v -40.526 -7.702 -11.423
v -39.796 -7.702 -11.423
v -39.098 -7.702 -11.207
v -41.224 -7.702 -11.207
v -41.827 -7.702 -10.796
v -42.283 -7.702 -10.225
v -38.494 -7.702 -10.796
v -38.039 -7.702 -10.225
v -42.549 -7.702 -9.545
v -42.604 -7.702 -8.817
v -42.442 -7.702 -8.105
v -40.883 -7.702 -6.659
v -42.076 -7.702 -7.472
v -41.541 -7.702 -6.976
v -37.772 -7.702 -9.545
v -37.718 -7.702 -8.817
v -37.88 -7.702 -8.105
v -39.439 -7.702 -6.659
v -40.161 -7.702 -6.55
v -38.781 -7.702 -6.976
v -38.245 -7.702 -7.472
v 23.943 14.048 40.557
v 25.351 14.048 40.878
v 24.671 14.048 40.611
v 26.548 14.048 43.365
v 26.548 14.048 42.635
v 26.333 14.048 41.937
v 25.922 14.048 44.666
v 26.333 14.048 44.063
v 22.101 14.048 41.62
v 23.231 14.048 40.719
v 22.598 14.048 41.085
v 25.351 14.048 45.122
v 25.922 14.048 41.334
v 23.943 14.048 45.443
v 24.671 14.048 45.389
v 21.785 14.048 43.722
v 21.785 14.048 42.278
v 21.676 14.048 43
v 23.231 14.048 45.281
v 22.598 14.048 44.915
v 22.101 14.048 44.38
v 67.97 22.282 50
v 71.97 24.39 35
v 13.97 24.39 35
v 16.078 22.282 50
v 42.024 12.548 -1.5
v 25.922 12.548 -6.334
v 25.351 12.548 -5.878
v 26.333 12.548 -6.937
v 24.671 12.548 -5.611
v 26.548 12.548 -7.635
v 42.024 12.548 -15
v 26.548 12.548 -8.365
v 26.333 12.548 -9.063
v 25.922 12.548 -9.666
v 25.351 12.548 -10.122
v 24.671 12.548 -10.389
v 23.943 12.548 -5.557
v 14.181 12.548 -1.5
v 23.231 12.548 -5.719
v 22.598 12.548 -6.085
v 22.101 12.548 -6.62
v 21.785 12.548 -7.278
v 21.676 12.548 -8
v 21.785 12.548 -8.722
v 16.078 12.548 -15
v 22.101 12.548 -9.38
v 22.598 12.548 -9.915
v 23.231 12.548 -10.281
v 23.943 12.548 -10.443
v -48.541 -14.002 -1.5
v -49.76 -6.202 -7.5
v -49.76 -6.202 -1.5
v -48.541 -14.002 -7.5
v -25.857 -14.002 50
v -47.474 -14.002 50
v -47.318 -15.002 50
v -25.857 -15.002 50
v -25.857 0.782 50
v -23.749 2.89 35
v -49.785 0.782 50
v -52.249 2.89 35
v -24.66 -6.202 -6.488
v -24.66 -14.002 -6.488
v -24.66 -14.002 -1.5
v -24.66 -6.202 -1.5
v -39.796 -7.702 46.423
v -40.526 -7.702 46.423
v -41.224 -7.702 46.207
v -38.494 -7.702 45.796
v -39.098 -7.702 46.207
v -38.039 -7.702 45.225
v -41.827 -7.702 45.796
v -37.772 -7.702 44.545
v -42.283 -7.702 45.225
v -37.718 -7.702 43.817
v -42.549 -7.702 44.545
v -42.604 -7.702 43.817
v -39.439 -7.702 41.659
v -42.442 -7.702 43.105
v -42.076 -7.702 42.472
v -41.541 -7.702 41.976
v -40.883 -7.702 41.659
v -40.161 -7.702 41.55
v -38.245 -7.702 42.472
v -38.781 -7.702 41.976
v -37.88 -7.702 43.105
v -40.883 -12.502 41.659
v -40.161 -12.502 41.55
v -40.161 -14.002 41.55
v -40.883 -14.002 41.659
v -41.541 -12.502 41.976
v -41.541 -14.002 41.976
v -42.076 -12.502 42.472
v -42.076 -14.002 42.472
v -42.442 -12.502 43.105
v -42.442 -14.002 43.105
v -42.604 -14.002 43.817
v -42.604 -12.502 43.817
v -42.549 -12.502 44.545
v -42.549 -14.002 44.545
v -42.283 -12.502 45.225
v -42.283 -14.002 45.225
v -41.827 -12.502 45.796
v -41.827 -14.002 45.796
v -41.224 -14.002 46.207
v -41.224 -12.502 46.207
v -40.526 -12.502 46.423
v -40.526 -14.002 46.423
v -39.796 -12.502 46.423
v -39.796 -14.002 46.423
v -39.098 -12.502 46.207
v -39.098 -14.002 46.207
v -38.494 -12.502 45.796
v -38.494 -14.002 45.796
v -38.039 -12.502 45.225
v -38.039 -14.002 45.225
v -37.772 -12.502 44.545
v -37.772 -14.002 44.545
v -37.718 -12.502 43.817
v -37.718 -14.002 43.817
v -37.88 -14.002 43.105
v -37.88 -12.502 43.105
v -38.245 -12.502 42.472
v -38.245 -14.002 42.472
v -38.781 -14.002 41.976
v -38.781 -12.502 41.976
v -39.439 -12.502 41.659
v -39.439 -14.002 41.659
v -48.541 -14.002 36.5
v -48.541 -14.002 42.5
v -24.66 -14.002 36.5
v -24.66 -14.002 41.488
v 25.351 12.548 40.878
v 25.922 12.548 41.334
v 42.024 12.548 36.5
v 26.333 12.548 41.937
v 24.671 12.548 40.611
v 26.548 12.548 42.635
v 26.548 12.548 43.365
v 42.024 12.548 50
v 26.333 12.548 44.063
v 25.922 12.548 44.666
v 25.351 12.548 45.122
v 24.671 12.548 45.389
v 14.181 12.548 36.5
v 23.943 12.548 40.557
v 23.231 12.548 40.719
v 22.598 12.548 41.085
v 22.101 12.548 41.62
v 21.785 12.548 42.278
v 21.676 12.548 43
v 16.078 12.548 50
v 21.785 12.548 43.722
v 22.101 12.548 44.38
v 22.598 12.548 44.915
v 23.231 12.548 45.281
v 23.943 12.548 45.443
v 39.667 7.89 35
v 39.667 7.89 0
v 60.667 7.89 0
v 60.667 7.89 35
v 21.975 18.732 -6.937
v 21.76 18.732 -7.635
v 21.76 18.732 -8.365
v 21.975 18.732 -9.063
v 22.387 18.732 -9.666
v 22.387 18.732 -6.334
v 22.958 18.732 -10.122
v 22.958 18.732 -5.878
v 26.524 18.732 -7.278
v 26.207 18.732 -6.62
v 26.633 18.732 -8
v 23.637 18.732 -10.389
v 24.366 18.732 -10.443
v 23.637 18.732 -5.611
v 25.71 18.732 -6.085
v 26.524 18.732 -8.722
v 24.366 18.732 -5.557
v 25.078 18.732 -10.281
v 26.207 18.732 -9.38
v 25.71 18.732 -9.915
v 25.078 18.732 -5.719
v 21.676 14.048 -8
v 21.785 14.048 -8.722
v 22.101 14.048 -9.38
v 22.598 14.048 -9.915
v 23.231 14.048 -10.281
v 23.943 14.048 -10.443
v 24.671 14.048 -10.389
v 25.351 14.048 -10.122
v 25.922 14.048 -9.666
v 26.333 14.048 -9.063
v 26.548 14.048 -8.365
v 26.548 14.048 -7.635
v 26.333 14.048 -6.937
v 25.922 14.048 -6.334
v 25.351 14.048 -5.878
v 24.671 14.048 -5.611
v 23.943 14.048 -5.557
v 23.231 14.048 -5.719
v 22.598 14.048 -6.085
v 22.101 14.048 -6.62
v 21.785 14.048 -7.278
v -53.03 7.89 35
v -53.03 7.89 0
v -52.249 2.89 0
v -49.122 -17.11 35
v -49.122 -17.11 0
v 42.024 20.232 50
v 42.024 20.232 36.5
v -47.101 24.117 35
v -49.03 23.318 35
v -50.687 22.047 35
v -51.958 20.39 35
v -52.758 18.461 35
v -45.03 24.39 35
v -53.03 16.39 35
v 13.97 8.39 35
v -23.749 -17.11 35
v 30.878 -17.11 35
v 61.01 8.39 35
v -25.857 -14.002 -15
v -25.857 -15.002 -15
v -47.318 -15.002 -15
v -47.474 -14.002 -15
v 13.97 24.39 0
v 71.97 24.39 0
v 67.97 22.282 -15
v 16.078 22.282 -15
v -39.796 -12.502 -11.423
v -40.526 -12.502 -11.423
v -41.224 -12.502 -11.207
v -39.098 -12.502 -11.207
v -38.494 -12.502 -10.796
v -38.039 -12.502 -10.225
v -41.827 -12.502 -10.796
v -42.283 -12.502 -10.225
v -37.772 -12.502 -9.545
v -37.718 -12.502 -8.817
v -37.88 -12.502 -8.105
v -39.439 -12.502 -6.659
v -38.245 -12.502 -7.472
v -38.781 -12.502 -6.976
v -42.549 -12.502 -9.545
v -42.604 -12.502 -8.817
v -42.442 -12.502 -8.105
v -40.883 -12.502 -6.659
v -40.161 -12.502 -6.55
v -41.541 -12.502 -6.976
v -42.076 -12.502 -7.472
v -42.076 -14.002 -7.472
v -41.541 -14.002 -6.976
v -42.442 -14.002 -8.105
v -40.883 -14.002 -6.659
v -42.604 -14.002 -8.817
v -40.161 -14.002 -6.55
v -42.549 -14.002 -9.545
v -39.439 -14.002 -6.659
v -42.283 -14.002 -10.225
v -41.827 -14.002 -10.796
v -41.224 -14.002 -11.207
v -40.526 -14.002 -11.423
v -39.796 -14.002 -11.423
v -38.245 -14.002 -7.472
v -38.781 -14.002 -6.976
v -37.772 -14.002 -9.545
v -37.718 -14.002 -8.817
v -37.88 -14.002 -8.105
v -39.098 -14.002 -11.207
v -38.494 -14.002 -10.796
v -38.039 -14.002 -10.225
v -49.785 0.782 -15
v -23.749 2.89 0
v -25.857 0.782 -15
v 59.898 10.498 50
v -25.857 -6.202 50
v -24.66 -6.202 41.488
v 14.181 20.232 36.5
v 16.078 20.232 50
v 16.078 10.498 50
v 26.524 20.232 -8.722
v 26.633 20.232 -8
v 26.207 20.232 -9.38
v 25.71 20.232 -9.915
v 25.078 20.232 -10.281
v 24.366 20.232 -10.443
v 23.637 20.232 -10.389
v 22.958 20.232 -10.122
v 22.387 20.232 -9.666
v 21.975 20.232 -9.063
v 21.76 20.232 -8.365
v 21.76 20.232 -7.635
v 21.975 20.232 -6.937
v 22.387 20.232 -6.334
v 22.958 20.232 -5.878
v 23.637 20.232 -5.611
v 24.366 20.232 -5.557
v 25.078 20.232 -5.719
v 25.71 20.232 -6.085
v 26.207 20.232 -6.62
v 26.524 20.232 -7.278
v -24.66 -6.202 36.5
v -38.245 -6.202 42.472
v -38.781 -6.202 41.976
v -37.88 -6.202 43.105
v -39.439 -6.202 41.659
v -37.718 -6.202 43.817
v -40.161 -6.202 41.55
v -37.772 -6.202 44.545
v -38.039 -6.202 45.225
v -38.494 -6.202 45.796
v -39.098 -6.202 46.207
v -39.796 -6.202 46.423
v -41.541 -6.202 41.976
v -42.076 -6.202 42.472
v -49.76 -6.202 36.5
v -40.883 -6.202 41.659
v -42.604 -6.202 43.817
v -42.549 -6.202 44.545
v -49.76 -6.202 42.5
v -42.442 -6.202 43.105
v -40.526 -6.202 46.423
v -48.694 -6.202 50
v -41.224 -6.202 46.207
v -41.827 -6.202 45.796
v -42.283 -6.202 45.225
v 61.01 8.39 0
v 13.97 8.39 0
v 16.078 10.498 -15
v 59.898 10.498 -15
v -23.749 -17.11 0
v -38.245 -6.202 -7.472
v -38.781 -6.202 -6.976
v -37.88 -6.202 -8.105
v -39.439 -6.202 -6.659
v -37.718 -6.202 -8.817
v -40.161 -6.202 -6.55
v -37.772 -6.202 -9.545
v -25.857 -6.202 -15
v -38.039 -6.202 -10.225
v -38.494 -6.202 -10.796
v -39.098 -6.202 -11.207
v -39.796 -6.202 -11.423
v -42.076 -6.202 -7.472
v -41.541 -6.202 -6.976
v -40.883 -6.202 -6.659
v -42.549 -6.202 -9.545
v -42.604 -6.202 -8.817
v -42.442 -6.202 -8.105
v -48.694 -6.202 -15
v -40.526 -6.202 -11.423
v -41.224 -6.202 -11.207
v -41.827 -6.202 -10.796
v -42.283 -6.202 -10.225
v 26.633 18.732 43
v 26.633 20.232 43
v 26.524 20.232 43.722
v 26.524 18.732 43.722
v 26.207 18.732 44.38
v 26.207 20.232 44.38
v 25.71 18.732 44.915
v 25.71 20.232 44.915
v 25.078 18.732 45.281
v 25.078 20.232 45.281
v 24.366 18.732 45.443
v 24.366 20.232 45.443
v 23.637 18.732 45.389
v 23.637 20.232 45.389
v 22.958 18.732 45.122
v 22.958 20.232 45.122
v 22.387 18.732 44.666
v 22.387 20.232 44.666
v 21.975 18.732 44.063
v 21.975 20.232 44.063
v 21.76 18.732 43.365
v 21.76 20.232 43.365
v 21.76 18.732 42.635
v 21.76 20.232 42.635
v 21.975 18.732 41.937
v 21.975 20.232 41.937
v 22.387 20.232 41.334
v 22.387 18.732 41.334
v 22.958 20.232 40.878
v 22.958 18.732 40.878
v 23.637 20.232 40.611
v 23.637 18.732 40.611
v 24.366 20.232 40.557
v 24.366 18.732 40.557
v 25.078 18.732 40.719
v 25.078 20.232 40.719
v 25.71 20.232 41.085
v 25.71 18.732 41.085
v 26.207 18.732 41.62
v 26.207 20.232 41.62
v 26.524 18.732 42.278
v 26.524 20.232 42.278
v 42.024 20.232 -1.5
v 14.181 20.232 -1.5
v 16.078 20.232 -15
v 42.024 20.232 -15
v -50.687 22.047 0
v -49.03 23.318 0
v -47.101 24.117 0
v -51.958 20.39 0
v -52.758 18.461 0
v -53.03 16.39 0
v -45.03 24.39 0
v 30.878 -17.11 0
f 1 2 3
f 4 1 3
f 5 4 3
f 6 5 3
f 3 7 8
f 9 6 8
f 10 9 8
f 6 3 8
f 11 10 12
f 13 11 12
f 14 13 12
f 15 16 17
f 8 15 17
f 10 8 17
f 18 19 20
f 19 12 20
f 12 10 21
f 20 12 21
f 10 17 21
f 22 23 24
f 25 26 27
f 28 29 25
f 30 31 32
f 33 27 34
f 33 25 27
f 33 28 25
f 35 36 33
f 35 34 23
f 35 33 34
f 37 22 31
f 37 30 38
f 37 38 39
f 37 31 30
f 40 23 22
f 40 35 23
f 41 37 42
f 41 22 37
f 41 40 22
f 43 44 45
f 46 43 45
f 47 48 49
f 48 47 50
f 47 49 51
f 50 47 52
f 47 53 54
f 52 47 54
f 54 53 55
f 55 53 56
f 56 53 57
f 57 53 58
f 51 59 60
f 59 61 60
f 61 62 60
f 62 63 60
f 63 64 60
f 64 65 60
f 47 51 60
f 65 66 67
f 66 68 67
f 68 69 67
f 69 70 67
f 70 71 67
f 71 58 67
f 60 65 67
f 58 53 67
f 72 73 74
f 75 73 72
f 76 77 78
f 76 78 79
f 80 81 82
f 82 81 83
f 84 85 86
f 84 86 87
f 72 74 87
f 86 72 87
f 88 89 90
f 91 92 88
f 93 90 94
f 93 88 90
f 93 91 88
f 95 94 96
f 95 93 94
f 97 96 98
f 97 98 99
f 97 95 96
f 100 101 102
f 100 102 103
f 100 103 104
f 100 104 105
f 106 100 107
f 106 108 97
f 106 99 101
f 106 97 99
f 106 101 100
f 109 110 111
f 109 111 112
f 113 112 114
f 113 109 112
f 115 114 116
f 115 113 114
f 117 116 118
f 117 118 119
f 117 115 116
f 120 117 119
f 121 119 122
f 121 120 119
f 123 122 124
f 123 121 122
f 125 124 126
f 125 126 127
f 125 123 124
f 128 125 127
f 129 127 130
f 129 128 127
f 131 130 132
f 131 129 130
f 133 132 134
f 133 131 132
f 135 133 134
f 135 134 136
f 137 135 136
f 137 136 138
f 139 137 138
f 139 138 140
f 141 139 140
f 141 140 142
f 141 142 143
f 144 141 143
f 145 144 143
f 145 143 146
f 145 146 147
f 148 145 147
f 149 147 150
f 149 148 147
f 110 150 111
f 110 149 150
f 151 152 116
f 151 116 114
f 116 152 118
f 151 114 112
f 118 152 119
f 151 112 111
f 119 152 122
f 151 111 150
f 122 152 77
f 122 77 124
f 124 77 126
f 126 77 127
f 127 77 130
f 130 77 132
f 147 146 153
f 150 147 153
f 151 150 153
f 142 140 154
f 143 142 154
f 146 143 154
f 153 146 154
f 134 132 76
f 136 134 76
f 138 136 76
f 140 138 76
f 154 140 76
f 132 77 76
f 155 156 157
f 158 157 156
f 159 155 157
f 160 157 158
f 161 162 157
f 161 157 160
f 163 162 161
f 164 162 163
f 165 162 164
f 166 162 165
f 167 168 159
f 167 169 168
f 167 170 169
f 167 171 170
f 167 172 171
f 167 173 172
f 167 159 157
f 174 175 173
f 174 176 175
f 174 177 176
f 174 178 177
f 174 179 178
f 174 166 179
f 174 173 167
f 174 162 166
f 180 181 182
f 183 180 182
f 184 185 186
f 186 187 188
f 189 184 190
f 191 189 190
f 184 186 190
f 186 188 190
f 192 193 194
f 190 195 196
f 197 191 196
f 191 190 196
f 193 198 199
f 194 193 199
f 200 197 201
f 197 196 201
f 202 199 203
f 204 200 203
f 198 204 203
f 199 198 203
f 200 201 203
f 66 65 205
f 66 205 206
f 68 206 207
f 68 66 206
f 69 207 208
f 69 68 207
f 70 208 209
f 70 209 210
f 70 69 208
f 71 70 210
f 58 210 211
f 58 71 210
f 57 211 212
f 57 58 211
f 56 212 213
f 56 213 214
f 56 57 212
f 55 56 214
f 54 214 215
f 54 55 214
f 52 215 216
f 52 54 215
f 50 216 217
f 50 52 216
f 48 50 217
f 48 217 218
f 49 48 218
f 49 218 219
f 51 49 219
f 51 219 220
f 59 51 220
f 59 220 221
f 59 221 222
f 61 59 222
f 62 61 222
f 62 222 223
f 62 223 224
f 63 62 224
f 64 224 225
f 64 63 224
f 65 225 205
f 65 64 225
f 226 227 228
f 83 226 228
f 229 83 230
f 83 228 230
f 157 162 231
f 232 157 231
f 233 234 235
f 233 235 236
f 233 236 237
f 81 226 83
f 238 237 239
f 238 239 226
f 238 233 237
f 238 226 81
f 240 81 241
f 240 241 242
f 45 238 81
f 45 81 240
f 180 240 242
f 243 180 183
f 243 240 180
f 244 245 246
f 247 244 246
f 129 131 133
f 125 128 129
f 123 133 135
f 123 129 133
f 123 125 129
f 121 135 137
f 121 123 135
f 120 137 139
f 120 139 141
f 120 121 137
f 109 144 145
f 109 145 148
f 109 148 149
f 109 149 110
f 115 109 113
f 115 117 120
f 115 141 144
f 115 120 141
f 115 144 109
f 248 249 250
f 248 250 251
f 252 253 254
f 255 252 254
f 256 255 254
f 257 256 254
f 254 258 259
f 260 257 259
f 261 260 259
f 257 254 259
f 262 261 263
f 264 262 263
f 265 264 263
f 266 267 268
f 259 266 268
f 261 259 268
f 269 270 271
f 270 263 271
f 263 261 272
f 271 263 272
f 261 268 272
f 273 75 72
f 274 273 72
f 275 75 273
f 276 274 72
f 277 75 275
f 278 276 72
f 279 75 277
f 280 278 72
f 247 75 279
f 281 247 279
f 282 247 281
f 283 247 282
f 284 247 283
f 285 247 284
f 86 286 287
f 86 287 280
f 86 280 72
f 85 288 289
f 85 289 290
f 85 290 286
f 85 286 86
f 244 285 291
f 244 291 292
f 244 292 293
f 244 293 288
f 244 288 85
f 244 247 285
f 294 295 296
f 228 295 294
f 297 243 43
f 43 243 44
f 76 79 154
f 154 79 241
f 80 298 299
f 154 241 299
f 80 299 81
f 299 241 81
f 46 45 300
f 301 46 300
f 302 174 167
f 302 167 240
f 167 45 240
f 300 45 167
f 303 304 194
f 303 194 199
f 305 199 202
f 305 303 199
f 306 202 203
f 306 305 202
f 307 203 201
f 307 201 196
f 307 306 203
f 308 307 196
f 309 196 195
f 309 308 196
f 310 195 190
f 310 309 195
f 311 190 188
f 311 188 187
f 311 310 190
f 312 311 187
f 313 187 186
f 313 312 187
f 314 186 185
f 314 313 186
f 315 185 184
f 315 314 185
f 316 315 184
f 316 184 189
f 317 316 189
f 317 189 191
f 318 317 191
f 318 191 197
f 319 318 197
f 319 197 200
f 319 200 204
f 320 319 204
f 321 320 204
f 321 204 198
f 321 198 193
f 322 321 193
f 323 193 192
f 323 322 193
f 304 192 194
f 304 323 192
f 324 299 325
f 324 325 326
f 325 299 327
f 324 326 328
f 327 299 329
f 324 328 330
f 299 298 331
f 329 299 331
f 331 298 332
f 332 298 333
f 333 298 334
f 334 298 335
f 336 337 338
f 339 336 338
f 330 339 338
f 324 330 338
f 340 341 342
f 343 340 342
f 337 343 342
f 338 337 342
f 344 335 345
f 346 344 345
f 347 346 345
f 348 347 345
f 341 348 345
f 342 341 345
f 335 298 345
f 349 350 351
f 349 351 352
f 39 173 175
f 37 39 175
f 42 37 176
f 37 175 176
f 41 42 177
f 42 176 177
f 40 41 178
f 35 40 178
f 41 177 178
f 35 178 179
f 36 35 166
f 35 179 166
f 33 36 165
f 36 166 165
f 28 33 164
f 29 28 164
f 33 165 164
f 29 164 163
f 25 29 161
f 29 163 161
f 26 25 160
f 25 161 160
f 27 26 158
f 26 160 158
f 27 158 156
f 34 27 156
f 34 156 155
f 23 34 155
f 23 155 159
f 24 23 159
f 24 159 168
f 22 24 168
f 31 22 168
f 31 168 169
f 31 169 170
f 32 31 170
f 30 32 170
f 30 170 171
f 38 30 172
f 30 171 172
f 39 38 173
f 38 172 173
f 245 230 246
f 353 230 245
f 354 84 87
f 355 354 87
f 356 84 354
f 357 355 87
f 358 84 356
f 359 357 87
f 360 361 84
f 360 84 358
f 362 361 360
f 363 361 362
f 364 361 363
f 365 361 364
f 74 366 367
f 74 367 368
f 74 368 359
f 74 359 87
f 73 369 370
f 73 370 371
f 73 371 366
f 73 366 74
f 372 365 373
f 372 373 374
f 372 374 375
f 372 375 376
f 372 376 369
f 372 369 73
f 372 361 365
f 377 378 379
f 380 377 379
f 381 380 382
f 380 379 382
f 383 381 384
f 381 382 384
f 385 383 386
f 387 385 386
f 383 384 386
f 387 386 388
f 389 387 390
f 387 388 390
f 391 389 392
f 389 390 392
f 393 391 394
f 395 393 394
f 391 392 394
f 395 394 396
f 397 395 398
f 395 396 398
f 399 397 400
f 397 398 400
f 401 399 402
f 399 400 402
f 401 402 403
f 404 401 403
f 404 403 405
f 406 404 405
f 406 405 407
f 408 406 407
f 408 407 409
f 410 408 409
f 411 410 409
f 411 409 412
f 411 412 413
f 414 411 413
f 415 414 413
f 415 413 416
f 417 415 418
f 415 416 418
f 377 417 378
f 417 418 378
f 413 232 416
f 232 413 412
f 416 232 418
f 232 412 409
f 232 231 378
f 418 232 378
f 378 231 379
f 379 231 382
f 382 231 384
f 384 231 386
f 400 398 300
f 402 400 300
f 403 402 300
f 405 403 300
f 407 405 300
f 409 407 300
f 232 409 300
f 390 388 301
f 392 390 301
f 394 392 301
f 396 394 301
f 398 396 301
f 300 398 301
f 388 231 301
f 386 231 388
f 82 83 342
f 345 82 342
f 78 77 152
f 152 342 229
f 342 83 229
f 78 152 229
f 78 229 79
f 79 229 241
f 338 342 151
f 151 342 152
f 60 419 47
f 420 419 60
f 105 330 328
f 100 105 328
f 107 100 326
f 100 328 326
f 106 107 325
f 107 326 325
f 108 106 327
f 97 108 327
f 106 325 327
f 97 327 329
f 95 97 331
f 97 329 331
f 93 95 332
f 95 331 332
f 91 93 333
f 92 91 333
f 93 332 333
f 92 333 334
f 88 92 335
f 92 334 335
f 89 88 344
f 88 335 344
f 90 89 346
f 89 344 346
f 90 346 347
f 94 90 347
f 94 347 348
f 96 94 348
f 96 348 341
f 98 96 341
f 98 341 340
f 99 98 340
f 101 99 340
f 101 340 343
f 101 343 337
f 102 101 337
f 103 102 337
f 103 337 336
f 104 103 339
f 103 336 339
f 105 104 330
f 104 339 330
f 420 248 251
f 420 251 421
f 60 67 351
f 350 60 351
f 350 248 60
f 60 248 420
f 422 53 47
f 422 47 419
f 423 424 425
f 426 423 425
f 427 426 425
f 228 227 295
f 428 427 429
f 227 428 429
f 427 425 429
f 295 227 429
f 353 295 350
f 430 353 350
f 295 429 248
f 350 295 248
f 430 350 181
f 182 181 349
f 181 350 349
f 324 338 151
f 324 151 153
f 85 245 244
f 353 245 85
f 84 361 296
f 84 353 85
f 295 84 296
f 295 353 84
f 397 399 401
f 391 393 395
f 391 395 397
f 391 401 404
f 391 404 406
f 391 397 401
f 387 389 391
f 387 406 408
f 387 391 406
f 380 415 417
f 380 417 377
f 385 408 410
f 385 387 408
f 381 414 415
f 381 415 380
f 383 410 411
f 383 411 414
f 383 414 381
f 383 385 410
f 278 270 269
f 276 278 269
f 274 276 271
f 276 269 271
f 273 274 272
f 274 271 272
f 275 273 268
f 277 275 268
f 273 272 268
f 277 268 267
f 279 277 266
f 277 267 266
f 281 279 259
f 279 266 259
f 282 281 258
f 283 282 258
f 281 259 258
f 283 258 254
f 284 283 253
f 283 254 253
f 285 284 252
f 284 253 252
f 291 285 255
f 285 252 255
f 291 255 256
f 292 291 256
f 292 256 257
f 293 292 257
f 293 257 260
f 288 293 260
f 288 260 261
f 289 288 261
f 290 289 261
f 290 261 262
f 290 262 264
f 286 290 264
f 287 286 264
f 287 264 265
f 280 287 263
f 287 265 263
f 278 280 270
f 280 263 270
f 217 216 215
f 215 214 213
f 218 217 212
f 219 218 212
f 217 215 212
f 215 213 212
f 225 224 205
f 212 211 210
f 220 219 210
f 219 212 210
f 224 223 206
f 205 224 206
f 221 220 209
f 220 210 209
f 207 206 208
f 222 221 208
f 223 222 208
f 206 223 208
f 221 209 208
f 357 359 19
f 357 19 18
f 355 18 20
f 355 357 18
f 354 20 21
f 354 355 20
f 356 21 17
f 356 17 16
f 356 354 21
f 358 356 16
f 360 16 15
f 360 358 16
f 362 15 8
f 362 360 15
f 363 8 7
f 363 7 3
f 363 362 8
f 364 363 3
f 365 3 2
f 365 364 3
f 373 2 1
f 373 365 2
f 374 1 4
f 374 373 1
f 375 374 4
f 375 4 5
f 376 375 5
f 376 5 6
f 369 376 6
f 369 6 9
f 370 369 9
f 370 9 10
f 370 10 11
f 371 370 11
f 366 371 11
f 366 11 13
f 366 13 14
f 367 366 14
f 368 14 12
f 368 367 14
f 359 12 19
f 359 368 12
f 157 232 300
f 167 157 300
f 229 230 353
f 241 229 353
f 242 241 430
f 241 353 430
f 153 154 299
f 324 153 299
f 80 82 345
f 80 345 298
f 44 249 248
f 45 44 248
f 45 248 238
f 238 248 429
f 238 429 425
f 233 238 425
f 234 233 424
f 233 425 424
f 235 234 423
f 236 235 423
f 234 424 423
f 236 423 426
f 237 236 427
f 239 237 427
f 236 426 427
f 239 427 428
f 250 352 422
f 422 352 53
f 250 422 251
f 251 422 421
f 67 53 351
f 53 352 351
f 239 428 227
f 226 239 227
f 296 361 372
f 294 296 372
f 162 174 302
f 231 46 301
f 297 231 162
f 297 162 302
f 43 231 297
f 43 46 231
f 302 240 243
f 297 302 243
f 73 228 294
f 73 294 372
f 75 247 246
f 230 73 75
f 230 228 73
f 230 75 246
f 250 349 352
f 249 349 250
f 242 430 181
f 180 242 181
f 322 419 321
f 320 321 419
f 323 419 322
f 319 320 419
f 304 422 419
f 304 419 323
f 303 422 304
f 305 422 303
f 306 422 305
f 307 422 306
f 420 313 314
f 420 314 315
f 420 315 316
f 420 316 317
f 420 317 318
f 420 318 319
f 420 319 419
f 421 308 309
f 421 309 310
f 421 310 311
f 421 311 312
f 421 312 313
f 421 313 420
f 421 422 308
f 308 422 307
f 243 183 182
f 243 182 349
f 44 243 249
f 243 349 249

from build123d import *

# Parameters (mm, degrees)
SALIENTE_EXTRUIR1_DEPTH           = 35
SALIENTE_EXTRUIR2_DEPTH           = 15
SALIENTE_EXTRUIR2_DRAFT           = 8
SALIENTE_EXTRUIR2_PROFILE_2_DEPTH = 15
SALIENTE_EXTRUIR2_PROFILE_2_DRAFT = 8
SIMETR_A1_COPY_1_DEPTH            = 15
SIMETR_A1_COPY_1_DRAFT            = 8
SIMETR_A1_COPY_2_DEPTH            = 15
SIMETR_A1_COPY_2_DRAFT            = 8
SIMETR_A1_COPY_3_DEPTH            = 15
SIMETR_A1_COPY_3_DRAFT            = 8
CROQUIS6_W                        = 28.054373897
CROQUIS6_H                        = 7.683774959
CORTAR_EXTRUIR2_DEPTH             = 13.5
CROQUIS8_R                        = 2.45
SALIENTE_EXTRUIR3_DEPTH           = 1.5
CROQUIS9_R                        = 2.45
SALIENTE_EXTRUIR4_DEPTH           = 1.5
CROQUIS10_R                       = 2.45
SALIENTE_EXTRUIR5_DEPTH           = 1.5
SALIENTE_EXTRUIR6_START           = 1.5
CROQUIS13_R                       = 2.45
SALIENTE_EXTRUIR6_DEPTH           = 1.5


with BuildPart() as part:
    # Croquis2 → Saliente-Extruir1 (new body)
    with BuildSketch(Plane.XY):
        with BuildLine():
            Line((30.877885102, -17.110048254), (39.667083018, 7.889951746))
            Line((39.667083018, 7.889951746), (60.667083018, 7.889951746))
            Line((60.667083018, 7.889951746), (71.969737573, 24.389951746))
            Line((71.969737573, 24.389951746), (-45.030262427, 24.389951746))
            ThreePointArc((-45.030262427, 24.389951746), (-50.687116676, 22.046805996), (-53.030262427, 16.389951746))
            Line((-53.030262427, 16.389951746), (-53.030262427, 7.889951746))
            Line((-53.030262427, 7.889951746), (-49.122114898, -17.110048254))
            Line((-49.122114898, -17.110048254), (30.877885102, -17.110048254))
        make_face()
    extrude(amount=SALIENTE_EXTRUIR1_DEPTH)


with BuildPart() as saliente_extruir2_tool:
    # Croquis5 → Saliente-Extruir2 (with draft: the straight prism first)
    with BuildSketch(Plane.XY.offset(35)):
        Polygon((-49.122114898, -17.110048254), (-23.748632921, -17.110048254), (-23.748632921, 2.889951746), (-52.248632921, 2.889951746), align=None)
    extrude(amount=SALIENTE_EXTRUIR2_DEPTH)
    # Saliente-Extruir2: the draft: its side faces are tilted about the plane it starts from
    saliente_extruir2_sides = [saliente_extruir2_tool.faces().sort_by_distance(p)[0] for p in [
        (-36.435373909, -17.110048254, 42.5),
        (-23.748632921, -7.110048254, 42.5),
        (-37.998632921, 2.889951746, 42.5),
        (-50.685373909, -7.110048254, 42.5),
    ]]
    draft(saliente_extruir2_sides, Plane.XY.offset(35), SALIENTE_EXTRUIR2_DRAFT)


with BuildPart() as part_1:
    add(part.part)

    # Saliente-Extruir2: add saliente_extruir2_tool
    add(saliente_extruir2_tool.part)


with BuildPart() as saliente_extruir2_profile_2_tool:
    # Croquis5 → Saliente-Extruir2 profile 2 (with draft: the straight prism first)
    with BuildSketch(Plane.XY.offset(35)):
        Polygon((71.969737573, 24.389951746), (13.969737573, 24.389951746), (13.969737573, 8.389951746), (61.009587702, 8.389951746), align=None)
    extrude(amount=SALIENTE_EXTRUIR2_PROFILE_2_DEPTH)
    # Saliente-Extruir2 profile 2: the draft: its side faces are tilted about the plane it starts from
    saliente_extruir2_profile_2_sides = [saliente_extruir2_profile_2_tool.faces().sort_by_distance(p)[0] for p in [
        (42.969737573, 24.389951746, 42.5),
        (13.969737573, 16.389951746, 42.5),
        (37.489662638, 8.389951746, 42.5),
        (66.489662638, 16.389951746, 42.5),
    ]]
    draft(saliente_extruir2_profile_2_sides, Plane.XY.offset(35), SALIENTE_EXTRUIR2_PROFILE_2_DRAFT)


with BuildPart() as part_2:
    add(part_1.part)

    # Saliente-Extruir2 profile 2: add saliente_extruir2_profile_2_tool
    add(saliente_extruir2_profile_2_tool.part)


with BuildPart() as simetr_a1_copy_1_tool:
    # Simetría1 copy 1 sketch → Simetría1 copy 1 (with draft: the straight prism first)
    with BuildSketch(Plane(origin=(0, 0, 0), x_dir=(1, 0, 0), z_dir=(0, 0, -1))):
        Polygon((-49.122114898, 17.110048254), (-23.748632921, 17.110048254), (-23.748632921, -2.889951746), (-52.248632921, -2.889951746), align=None)
    extrude(amount=SIMETR_A1_COPY_1_DEPTH)
    # Simetría1 copy 1: the draft: its side faces are tilted about the plane it starts from
    simetr_a1_copy_1_sides = [simetr_a1_copy_1_tool.faces().sort_by_distance(p)[0] for p in [
        (-36.435373909, -17.110048254, -7.5),
        (-23.748632921, -7.110048254, -7.5),
        (-37.998632921, 2.889951746, -7.5),
        (-50.685373909, -7.110048254, -7.5),
    ]]
    draft(simetr_a1_copy_1_sides, Plane(origin=(0, 0, 0), x_dir=(1, 0, 0), z_dir=(0, 0, -1)), SIMETR_A1_COPY_1_DRAFT)


with BuildPart() as part_3:
    add(part_2.part)

    # Simetría1 copy 1: add simetr_a1_copy_1_tool
    add(simetr_a1_copy_1_tool.part)


with BuildPart() as simetr_a1_copy_2_tool:
    # Simetría1 copy 2 sketch → Simetría1 copy 2 (with draft: the straight prism first)
    with BuildSketch(Plane(origin=(0, 0, 0), x_dir=(1, 0, 0), z_dir=(0, 0, -1))):
        Polygon((71.969737573, -24.389951746), (13.969737573, -24.389951746), (13.969737573, -8.389951746), (61.009587702, -8.389951746), align=None)
    extrude(amount=SIMETR_A1_COPY_2_DEPTH)
    # Simetría1 copy 2: the draft: its side faces are tilted about the plane it starts from
    simetr_a1_copy_2_sides = [simetr_a1_copy_2_tool.faces().sort_by_distance(p)[0] for p in [
        (42.969737573, 24.389951746, -7.5),
        (13.969737573, 16.389951746, -7.5),
        (37.489662638, 8.389951746, -7.5),
        (66.489662638, 16.389951746, -7.5),
    ]]
    draft(simetr_a1_copy_2_sides, Plane(origin=(0, 0, 0), x_dir=(1, 0, 0), z_dir=(0, 0, -1)), SIMETR_A1_COPY_2_DRAFT)


with BuildPart() as part_4:
    add(part_3.part)

    # Simetría1 copy 2: add simetr_a1_copy_2_tool
    add(simetr_a1_copy_2_tool.part)


with BuildPart() as simetr_a1_copy_3_tool:
    # Simetría1 copy 3 sketch → Simetría1 copy 3 (with draft: the straight prism first)
    with BuildSketch(Plane(origin=(0, 0, 0), x_dir=(1, 0, 0), z_dir=(0, 0, -1))):
        Polygon((71.969737573, -24.389951746), (13.969737573, -24.389951746), (13.969737573, -8.389951746), (61.009587702, -8.389951746), align=None)
    extrude(amount=SIMETR_A1_COPY_3_DEPTH)
    # Simetría1 copy 3: the draft: its side faces are tilted about the plane it starts from
    simetr_a1_copy_3_sides = [simetr_a1_copy_3_tool.faces().sort_by_distance(p)[0] for p in [
        (42.969737573, 24.389951746, -7.5),
        (13.969737573, 16.389951746, -7.5),
        (37.489662638, 8.389951746, -7.5),
        (66.489662638, 16.389951746, -7.5),
    ]]
    draft(simetr_a1_copy_3_sides, Plane(origin=(0, 0, 0), x_dir=(1, 0, 0), z_dir=(0, 0, -1)), SIMETR_A1_COPY_3_DRAFT)


with BuildPart() as part_5:
    add(part_4.part)

    # Simetría1 copy 3: add simetr_a1_copy_3_tool
    add(simetr_a1_copy_3_tool.part)

    # Croquis6 → Cortar-Extruir2 (cut)
    with BuildSketch(Plane(origin=(0, 0, -15), x_dir=(-1, 0, 0), z_dir=(0, 0, -1))):
        with Locations((-27.996924522, 16.389951747)):
            Rectangle(CROQUIS6_W, CROQUIS6_H)
        Polygon((24.660477495, -6.201935733), (49.760477495, -6.201935733), (48.541135466, -14.001935733), (24.660477495, -14.001935733), align=None)
    cortar_extruir2 = extrude(amount=-CORTAR_EXTRUIR2_DEPTH, mode=Mode.SUBTRACT)

    # Simetría2: Cortar-Extruir2 across plane
    add(cortar_extruir2.mirror(Plane(origin=(0, 0, 17.5), x_dir=(1, 0, 0), z_dir=(0, 0, -1))), mode=Mode.SUBTRACT)

    # Croquis8 → Saliente-Extruir3 (add)
    with BuildSketch(Plane.XZ.offset(-20.231839226)):
        with Locations((24.182512404, 43)):
            Circle(CROQUIS8_R)
    saliente_extruir3 = extrude(amount=SALIENTE_EXTRUIR3_DEPTH)

    # Simetría3: Saliente-Extruir3 across plane
    add(saliente_extruir3.mirror(Plane(origin=(0, 0, 17.5), x_dir=(1, 0, 0), z_dir=(0, 0, -1))))

    # Croquis9 → Saliente-Extruir4 (add)
    with BuildSketch(Plane(origin=(0, 12.548064267, 0), x_dir=(1, 0, 0), z_dir=(0, 1, 0))):
        with Locations(Location((24.125726568, -43, 0), (0, 0, 180))):
            Circle(CROQUIS9_R)
    saliente_extruir4 = extrude(amount=SALIENTE_EXTRUIR4_DEPTH)

    # Simetría4: Saliente-Extruir4 across plane
    add(saliente_extruir4.mirror(Plane(origin=(0, 0, 17.5), x_dir=(1, 0, 0), z_dir=(0, 0, -1))))

    # Croquis10 → Saliente-Extruir5 (add)
    with BuildSketch(Plane.XZ.offset(6.201935733)):
        with Locations(Location((-40.160914021, 44, 0), (0, 0, 270))):
            Circle(CROQUIS10_R)
    saliente_extruir5 = extrude(amount=SALIENTE_EXTRUIR5_DEPTH)

    # Simetría5: Saliente-Extruir5 across plane
    add(saliente_extruir5.mirror(Plane(origin=(0, 0, 17.5), x_dir=(1, 0, 0), z_dir=(0, 0, -1))))

    # Croquis13 → Saliente-Extruir6 (add)
    with BuildSketch(Plane(origin=(0, -14.001935733, 0), x_dir=(1, 0, 0), z_dir=(0, 1, 0)).offset(SALIENTE_EXTRUIR6_START)):
        with Locations(Location((-40.160914021, -44, 0), (0, 0, 90))):
            Circle(CROQUIS13_R)
    saliente_extruir6 = extrude(amount=-SALIENTE_EXTRUIR6_DEPTH)

    # Simetría6: Saliente-Extruir6 across plane
    add(saliente_extruir6.mirror(Plane(origin=(0, 0, 17.5), x_dir=(1, 0, 0), z_dir=(0, 0, -1))))


solid = part_5.part
